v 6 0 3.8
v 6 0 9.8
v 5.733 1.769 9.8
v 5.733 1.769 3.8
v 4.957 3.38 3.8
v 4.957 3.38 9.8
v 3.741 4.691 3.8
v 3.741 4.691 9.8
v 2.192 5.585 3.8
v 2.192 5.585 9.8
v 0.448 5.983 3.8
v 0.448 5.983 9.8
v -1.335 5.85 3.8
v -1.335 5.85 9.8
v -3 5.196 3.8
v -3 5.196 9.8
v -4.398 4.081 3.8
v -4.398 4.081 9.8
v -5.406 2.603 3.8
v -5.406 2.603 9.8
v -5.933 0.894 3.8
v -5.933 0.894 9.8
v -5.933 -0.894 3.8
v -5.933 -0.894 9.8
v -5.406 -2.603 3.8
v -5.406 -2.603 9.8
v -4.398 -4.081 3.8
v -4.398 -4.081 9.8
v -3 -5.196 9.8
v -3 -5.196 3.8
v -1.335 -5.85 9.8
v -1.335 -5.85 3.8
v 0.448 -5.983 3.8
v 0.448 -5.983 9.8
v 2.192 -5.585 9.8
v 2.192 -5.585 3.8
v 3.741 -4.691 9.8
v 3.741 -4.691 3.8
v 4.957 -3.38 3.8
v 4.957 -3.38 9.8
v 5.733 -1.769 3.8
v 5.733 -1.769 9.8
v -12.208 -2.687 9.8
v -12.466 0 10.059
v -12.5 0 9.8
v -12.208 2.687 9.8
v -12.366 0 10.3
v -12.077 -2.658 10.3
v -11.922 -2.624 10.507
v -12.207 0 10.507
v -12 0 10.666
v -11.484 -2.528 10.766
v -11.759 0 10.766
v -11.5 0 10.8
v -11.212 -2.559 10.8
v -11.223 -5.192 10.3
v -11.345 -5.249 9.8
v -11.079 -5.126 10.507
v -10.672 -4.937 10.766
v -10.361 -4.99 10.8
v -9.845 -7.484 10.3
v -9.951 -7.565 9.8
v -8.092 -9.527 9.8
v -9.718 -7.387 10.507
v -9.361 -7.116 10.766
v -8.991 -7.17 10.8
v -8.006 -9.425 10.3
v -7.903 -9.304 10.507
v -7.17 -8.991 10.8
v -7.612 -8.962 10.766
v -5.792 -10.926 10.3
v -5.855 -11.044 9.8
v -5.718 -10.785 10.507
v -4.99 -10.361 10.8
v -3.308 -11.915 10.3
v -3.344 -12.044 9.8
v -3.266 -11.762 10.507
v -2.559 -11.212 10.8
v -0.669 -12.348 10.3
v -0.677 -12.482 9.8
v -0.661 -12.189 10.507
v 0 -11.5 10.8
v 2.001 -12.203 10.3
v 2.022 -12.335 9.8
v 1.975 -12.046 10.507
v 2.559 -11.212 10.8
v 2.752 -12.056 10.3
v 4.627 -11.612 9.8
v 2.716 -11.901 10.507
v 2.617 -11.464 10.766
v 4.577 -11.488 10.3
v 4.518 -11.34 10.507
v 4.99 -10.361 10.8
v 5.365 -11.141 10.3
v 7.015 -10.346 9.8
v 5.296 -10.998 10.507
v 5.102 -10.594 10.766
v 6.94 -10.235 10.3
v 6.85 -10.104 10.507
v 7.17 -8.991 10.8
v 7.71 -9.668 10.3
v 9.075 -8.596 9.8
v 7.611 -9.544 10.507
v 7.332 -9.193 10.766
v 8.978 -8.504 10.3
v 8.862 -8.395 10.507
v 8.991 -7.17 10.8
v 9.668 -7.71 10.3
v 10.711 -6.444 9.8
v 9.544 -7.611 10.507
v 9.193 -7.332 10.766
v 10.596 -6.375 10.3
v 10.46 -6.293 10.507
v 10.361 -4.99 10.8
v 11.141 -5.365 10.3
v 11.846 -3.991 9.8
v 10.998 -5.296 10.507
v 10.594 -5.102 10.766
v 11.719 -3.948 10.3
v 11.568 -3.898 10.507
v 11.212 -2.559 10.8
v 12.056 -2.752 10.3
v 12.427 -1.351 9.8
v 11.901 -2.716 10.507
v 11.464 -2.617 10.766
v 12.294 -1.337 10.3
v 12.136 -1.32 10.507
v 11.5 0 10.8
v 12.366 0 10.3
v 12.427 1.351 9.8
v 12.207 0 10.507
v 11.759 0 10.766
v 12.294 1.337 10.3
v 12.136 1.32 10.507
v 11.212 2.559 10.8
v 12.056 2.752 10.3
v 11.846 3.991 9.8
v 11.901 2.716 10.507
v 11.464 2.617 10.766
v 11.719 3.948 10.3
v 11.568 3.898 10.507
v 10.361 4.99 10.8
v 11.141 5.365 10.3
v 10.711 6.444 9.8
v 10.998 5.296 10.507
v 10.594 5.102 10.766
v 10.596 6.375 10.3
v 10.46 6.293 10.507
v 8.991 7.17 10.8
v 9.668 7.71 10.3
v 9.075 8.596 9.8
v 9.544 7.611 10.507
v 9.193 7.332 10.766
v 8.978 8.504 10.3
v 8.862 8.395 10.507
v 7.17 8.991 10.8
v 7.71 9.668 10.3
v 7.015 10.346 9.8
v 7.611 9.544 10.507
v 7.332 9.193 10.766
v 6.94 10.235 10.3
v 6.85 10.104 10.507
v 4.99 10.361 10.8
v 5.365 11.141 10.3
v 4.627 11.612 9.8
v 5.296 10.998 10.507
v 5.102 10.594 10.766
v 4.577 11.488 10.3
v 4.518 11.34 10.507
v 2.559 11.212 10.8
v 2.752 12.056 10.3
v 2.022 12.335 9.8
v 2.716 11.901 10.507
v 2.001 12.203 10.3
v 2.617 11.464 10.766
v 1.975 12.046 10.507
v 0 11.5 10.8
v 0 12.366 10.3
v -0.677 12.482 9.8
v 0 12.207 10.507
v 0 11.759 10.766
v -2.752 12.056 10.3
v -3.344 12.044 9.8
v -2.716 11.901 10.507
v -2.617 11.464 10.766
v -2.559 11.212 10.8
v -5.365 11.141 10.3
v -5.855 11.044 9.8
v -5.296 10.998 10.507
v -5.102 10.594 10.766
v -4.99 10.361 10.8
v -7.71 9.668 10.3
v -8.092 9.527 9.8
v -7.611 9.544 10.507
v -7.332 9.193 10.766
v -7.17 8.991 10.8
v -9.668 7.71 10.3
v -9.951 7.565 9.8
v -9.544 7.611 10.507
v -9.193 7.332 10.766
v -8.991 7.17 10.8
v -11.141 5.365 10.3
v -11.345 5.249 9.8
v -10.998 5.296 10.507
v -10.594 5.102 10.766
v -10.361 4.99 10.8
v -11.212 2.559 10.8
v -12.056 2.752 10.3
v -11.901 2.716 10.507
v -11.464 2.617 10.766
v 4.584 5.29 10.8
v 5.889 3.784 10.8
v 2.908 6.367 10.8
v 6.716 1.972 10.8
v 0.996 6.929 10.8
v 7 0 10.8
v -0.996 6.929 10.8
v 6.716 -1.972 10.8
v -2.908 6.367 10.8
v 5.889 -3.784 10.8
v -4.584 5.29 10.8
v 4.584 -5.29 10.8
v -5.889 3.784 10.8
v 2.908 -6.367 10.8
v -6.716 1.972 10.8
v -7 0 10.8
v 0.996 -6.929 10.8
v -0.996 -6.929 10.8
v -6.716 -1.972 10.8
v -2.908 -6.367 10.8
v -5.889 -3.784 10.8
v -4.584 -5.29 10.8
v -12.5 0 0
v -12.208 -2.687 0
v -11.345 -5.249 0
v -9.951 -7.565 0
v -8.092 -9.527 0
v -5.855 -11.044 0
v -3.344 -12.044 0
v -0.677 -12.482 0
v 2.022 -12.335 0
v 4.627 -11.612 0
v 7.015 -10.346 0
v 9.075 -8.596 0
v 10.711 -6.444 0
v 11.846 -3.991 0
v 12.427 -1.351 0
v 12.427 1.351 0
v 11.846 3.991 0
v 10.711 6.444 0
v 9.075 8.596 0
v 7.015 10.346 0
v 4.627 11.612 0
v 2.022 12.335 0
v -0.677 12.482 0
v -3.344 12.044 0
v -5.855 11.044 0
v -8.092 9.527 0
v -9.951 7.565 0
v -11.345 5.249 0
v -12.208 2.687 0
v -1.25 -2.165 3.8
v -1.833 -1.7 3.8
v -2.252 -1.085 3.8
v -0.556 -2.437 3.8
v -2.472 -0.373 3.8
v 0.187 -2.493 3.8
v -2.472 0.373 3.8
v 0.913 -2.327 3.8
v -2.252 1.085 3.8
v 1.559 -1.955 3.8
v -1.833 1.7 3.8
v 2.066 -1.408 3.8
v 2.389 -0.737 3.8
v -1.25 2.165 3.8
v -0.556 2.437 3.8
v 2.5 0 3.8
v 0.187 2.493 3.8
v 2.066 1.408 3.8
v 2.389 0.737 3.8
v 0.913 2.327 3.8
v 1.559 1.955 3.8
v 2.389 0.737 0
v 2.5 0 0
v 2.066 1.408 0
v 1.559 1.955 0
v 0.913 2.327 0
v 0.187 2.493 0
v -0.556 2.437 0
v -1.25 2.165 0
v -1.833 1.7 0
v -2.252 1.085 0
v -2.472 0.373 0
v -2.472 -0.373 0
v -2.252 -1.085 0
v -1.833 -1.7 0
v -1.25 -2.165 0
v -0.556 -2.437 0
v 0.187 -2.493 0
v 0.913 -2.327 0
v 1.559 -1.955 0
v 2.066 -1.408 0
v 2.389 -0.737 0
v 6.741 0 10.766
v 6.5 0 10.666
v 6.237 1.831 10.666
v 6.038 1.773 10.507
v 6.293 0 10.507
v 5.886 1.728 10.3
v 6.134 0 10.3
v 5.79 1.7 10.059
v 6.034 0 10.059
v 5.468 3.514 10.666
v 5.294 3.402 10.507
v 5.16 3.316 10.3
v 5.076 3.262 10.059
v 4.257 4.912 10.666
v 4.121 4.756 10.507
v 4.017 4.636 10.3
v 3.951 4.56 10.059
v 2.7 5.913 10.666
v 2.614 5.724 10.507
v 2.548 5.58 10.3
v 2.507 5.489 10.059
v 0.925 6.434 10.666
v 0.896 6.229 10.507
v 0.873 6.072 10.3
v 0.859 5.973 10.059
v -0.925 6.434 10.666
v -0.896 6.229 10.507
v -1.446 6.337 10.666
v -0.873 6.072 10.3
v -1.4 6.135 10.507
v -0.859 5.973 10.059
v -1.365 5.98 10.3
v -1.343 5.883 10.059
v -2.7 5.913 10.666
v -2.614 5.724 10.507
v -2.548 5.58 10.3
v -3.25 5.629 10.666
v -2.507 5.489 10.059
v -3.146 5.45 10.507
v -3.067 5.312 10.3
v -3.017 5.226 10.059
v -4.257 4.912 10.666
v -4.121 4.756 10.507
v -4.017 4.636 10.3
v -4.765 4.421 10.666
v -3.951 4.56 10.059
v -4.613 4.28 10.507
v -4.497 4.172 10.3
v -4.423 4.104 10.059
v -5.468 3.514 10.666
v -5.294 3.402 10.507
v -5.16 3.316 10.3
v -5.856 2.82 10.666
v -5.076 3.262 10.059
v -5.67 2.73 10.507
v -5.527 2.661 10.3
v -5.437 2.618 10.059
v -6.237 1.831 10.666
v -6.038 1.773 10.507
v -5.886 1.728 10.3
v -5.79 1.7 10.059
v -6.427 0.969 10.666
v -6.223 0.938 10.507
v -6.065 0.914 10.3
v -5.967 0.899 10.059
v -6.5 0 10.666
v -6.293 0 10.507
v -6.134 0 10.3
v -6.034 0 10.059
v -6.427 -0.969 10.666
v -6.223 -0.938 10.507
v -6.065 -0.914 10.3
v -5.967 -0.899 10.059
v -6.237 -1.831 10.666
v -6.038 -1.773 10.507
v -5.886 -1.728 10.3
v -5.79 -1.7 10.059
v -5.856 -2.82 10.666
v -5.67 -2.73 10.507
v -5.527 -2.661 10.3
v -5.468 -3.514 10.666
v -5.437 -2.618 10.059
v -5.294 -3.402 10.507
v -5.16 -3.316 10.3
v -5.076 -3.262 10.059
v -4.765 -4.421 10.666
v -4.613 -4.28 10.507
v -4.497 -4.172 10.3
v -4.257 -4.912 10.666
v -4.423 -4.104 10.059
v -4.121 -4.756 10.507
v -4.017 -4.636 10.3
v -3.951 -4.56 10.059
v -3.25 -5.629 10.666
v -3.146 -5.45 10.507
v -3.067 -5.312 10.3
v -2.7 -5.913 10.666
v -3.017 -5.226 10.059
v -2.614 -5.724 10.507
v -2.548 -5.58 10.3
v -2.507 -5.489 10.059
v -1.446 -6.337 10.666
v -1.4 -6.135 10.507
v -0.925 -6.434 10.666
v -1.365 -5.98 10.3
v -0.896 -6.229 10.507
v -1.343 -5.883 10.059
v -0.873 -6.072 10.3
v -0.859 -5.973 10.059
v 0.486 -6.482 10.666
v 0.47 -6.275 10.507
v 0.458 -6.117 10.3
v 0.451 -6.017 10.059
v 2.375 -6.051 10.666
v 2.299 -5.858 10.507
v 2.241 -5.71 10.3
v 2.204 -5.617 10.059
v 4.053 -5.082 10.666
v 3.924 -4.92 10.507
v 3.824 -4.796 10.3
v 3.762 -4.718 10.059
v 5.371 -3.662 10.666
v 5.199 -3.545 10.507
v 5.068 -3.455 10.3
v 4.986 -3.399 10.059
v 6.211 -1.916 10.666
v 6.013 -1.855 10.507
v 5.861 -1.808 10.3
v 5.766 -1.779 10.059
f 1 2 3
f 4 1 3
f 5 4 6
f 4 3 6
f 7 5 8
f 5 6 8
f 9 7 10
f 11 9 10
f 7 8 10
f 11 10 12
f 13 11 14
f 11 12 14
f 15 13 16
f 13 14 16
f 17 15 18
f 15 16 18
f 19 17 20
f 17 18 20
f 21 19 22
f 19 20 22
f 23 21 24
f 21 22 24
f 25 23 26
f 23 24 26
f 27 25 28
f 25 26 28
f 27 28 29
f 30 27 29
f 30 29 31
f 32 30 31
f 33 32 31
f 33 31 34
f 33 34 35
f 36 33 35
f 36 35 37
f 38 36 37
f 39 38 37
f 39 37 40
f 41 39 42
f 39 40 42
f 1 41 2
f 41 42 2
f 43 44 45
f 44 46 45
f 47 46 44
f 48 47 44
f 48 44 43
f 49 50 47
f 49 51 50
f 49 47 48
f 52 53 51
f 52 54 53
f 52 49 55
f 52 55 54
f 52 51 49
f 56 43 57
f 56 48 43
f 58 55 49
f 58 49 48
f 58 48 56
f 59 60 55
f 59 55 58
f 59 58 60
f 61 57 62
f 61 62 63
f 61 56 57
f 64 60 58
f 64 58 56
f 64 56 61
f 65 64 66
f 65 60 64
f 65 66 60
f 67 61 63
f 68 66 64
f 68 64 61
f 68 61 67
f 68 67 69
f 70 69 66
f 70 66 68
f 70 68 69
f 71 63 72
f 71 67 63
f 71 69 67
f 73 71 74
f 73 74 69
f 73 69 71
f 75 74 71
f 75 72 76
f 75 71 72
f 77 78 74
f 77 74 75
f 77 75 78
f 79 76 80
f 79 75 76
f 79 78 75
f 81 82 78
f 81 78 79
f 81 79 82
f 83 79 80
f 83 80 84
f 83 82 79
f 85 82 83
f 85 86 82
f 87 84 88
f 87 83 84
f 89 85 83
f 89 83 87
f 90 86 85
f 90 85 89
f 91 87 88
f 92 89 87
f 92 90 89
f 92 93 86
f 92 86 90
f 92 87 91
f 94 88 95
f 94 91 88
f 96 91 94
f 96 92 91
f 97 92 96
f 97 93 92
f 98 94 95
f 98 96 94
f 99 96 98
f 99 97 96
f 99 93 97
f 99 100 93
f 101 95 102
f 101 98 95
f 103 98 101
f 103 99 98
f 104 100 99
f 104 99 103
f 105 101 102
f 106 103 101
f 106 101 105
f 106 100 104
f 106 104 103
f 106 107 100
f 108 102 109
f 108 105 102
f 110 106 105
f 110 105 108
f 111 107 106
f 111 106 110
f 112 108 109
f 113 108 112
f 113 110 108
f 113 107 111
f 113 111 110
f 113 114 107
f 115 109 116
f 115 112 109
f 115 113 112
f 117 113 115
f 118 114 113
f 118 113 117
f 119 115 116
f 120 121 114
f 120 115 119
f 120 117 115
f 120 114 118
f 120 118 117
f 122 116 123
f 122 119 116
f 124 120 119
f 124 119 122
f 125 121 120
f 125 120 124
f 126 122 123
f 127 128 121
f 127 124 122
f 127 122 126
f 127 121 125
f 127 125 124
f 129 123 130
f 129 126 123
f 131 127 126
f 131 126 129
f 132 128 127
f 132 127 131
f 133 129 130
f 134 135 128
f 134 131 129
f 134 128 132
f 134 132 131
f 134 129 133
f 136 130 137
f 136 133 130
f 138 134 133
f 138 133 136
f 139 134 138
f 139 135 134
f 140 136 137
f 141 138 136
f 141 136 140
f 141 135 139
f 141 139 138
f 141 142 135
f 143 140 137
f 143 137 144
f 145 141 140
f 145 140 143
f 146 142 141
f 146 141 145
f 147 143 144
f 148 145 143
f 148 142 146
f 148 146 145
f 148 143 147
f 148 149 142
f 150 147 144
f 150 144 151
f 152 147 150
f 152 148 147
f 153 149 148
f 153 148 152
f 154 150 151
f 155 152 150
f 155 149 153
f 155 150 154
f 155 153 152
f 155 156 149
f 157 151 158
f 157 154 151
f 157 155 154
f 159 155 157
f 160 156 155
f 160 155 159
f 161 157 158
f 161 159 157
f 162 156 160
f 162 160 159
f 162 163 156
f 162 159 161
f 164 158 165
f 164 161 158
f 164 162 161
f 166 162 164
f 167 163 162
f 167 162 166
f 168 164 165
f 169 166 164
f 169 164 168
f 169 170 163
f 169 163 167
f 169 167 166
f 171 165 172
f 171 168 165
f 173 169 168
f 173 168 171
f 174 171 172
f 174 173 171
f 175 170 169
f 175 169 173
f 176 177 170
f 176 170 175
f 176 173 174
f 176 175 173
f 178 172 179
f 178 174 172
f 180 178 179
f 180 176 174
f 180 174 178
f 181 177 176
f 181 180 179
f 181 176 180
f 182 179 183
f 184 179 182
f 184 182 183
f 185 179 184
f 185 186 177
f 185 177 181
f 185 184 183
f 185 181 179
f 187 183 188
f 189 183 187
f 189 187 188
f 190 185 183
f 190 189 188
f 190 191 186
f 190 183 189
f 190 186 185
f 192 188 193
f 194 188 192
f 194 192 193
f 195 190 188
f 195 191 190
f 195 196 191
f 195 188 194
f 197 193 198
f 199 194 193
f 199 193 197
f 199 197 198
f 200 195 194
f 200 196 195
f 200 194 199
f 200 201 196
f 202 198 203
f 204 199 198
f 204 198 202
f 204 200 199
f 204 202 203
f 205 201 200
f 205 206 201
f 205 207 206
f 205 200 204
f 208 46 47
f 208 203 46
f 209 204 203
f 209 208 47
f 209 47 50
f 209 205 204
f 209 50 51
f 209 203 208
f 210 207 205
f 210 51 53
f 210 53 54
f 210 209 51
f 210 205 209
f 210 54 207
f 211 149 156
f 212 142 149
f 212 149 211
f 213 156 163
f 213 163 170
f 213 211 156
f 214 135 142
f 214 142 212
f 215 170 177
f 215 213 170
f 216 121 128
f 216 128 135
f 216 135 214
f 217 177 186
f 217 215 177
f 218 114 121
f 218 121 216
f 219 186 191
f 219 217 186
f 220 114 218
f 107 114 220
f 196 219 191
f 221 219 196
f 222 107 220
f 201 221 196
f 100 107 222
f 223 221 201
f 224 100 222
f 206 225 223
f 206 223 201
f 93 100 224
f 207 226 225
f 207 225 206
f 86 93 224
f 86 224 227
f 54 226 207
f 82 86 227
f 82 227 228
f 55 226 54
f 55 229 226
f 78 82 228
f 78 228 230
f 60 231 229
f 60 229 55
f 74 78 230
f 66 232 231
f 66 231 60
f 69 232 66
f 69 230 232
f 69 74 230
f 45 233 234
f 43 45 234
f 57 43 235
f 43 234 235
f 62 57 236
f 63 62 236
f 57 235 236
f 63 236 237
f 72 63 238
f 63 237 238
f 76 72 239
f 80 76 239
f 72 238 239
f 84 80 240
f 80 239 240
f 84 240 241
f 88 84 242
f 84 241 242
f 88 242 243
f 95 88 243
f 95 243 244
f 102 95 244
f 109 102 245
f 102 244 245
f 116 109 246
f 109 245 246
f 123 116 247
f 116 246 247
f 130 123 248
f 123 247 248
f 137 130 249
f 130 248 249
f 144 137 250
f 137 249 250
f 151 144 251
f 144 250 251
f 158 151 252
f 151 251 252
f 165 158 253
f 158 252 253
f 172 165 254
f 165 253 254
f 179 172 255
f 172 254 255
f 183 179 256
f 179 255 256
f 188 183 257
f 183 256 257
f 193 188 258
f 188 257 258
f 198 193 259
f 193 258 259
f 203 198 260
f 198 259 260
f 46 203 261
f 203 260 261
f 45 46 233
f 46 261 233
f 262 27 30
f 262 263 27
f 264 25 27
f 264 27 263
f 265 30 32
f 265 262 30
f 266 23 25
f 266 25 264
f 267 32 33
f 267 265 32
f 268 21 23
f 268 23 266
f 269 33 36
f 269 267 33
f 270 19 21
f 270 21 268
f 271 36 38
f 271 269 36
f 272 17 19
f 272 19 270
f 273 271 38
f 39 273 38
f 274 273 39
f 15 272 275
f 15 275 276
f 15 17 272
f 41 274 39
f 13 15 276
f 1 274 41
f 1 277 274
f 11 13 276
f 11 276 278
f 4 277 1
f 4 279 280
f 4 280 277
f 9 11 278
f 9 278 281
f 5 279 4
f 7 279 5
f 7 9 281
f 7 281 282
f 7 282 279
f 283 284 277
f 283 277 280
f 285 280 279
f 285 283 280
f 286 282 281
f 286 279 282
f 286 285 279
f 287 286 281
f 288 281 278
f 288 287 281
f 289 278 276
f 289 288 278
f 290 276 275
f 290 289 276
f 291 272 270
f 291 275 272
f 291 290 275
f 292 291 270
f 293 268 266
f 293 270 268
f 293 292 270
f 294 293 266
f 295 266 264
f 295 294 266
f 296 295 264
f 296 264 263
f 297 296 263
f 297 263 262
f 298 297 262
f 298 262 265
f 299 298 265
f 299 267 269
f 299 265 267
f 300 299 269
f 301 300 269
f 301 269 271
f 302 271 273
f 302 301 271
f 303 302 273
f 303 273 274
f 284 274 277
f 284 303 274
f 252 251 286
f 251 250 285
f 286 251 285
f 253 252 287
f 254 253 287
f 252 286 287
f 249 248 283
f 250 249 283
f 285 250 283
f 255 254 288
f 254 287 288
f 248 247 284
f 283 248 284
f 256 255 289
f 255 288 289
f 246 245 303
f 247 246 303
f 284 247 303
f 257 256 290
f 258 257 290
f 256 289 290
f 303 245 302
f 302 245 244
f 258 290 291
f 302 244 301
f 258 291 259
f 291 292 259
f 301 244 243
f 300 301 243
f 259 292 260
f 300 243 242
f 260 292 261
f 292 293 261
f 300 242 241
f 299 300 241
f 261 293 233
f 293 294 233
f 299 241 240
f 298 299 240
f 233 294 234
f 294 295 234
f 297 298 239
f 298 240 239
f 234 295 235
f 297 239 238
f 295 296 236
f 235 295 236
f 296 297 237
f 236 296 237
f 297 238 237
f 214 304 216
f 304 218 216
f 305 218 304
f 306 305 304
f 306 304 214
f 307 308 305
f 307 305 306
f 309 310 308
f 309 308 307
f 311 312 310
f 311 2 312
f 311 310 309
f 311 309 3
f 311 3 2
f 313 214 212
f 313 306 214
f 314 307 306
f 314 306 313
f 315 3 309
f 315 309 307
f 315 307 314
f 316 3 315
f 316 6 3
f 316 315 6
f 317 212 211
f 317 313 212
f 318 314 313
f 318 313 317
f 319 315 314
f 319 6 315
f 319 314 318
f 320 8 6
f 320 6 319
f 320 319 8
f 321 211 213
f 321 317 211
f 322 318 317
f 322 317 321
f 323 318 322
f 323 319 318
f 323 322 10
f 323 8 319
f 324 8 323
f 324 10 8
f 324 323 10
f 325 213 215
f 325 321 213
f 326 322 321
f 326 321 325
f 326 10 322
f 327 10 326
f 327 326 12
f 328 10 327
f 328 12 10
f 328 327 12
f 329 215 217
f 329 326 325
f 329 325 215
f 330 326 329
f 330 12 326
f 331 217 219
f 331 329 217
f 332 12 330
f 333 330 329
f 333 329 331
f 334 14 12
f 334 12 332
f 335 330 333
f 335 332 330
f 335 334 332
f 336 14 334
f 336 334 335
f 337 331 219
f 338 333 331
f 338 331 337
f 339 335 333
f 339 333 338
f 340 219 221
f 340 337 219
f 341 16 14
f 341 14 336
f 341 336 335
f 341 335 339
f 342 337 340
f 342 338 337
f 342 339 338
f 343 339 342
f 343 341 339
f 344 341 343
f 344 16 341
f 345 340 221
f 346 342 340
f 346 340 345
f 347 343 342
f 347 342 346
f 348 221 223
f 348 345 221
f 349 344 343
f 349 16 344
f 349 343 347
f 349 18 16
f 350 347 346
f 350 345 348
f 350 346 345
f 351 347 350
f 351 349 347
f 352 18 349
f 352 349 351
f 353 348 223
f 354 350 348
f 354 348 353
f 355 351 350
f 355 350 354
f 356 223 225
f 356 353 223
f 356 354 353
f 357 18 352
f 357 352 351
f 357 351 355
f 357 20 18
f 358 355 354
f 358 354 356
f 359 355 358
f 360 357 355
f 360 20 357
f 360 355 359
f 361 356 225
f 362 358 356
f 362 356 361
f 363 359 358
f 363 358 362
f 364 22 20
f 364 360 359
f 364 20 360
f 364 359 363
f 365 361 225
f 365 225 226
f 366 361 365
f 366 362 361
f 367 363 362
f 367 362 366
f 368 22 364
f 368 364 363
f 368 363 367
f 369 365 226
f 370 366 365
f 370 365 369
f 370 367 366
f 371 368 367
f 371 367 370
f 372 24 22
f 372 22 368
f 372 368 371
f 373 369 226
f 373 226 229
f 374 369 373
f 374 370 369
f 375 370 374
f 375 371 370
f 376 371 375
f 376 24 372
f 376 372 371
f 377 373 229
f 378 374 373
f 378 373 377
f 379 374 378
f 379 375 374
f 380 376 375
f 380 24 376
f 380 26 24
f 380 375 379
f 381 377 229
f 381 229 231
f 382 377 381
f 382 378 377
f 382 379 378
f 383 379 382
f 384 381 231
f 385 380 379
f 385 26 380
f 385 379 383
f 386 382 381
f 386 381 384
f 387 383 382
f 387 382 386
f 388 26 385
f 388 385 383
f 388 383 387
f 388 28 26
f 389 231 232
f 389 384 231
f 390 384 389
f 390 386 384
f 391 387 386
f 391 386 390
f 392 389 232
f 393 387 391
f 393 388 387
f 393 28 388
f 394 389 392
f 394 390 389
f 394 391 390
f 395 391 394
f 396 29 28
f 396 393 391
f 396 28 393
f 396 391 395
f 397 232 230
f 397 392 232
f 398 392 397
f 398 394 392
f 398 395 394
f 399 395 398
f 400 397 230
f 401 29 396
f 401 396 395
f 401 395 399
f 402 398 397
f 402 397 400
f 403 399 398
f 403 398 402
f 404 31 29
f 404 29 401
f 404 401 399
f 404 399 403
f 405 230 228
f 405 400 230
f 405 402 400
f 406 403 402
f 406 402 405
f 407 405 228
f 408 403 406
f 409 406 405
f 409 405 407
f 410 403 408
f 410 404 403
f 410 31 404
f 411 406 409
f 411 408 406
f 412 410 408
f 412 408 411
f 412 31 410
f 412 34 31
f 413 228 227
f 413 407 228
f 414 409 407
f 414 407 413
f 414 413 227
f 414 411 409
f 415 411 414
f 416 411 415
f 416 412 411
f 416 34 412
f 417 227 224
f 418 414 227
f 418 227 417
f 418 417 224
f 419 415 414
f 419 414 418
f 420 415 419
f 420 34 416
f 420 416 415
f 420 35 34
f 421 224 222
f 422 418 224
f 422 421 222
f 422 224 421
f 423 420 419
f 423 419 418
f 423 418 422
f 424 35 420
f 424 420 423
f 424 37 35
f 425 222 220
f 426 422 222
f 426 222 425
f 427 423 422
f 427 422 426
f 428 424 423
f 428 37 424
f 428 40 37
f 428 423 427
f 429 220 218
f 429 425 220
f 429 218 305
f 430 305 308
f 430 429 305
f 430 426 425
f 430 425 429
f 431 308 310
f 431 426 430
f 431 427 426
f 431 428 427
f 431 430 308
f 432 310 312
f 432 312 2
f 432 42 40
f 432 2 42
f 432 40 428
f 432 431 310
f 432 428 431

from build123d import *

# Parameters (mm, degrees)
SKIZZE1_R                            = 12.5
AUFSATZ_LINEAR_AUSTRAGEN1_DEPTH      = 10.8
SKIZZE2_R                            = 6
SCHNITT_LINEAR_AUSTRAGEN1_DEPTH      = 7
SCHNITT_LINEAR_AUSTRAGEN2_DEPTH      = 20.013153342
SCHNITT_LINEAR_AUSTRAGEN2_DEPTH_BACK = 20.013153342
SKIZZE3_R                            = 2.5
VERRUNDUNG1_R                        = 1


with BuildPart() as part:
    # Skizze1 → Aufsatz-Linear austragen1 (new body)
    with BuildSketch(Plane(origin=(0, 0, 0), x_dir=(0, 1, 0), z_dir=(0, 0, 1))):
        with Locations(Location((0, 0, 0), (0, 0, 90))):
            Circle(SKIZZE1_R)
    extrude(amount=AUFSATZ_LINEAR_AUSTRAGEN1_DEPTH)

    # Skizze2 → Schnitt-Linear austragen1 (cut)
    with BuildSketch(Plane.XY.offset(10.8)):
        Circle(SKIZZE2_R)
    extrude(amount=-SCHNITT_LINEAR_AUSTRAGEN1_DEPTH, mode=Mode.SUBTRACT)

    # Skizze3 → Schnitt-Linear austragen2 (cut, two sides: drawn at the far end of the back side and taken through both)
    with BuildSketch(Plane.XY.offset(3.8).offset(-SCHNITT_LINEAR_AUSTRAGEN2_DEPTH_BACK)):
        Circle(SKIZZE3_R)
    extrude(amount=SCHNITT_LINEAR_AUSTRAGEN2_DEPTH + SCHNITT_LINEAR_AUSTRAGEN2_DEPTH_BACK, mode=Mode.SUBTRACT)

    # Verrundung1
    verrundung1_edges = [part.edges().sort_by_distance(p)[0] for p in [
        (12.5, 0, 10.8),
        (-6, 0, 10.8),
    ]]
    fillet(verrundung1_edges, radius=VERRUNDUNG1_R)


solid = part.part
